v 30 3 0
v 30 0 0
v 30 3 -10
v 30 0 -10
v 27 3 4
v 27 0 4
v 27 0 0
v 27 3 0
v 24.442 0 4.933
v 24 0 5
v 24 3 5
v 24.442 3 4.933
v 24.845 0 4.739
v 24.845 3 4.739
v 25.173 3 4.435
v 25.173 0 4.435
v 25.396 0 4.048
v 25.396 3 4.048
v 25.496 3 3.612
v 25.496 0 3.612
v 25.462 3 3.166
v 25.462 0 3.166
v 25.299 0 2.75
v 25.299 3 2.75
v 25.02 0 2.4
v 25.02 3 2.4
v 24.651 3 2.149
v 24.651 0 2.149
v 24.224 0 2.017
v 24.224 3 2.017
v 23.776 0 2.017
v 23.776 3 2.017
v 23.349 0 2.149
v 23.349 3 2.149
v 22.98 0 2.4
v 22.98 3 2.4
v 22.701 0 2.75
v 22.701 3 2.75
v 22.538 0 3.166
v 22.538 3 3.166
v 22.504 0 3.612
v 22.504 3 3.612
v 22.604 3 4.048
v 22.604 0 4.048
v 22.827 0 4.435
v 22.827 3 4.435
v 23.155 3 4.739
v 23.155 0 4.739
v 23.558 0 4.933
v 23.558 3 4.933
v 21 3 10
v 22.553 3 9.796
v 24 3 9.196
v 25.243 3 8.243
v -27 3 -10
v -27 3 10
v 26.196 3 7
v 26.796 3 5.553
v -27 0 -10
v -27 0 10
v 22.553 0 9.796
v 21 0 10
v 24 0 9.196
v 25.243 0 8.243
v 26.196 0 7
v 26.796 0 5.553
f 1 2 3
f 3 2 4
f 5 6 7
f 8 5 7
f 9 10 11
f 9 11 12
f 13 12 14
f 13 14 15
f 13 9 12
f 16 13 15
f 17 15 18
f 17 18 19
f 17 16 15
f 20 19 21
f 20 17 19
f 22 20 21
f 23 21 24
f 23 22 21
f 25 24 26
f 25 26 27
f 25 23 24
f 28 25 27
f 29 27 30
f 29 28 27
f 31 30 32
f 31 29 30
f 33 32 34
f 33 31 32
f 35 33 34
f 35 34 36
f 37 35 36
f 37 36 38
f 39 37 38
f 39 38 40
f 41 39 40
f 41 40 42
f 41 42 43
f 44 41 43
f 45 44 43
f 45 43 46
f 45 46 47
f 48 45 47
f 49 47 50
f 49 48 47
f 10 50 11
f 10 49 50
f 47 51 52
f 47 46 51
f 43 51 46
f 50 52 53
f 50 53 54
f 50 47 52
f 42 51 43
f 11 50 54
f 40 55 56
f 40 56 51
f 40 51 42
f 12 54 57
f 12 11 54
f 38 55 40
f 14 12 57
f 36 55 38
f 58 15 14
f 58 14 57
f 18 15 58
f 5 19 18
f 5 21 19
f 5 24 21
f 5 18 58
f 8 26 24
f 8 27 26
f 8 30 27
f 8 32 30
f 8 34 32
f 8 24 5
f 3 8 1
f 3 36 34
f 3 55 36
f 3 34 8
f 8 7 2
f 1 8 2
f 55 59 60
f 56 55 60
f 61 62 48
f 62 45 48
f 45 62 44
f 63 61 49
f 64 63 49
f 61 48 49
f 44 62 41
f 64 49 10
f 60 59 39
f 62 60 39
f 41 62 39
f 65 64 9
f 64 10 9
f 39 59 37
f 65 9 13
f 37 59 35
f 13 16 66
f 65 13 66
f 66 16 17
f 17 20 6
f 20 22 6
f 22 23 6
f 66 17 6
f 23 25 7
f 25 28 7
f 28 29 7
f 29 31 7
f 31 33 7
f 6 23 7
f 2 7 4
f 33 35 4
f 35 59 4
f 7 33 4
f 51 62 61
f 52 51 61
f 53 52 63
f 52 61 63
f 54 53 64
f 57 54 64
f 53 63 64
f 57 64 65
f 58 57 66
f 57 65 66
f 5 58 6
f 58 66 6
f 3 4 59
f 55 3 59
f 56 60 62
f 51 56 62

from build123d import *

# Parameters (mm, degrees)
SKETCH1_R           = 1.5
BOSS_EXTRUDE1_DEPTH = 3


with BuildPart() as part:
    # Sketch1 → Boss-Extrude1 (new body)
    with BuildSketch(Plane(origin=(0, 0, 0), x_dir=(1, 0, 0), z_dir=(0, 1, 0))):
        with BuildLine():
            Line((27, 10), (-27, 10))
            Line((-27, 10), (-27, -10))
            Line((-27, -10), (21, -10))
            ThreePointArc((21, -10), (25.242640687, -8.242640687), (27, -4))
            Line((27, -4), (27, 0))
            Line((27, 0), (30, 0))
            Line((30, 0), (30, 10))
            Line((30, 10), (27, 10))
        make_face()
        with Locations(Location((24, -3.5, 0), (0, 0, 270))):
            Circle(SKETCH1_R, mode=Mode.SUBTRACT)
    extrude(amount=BOSS_EXTRUDE1_DEPTH)


solid = part.part
